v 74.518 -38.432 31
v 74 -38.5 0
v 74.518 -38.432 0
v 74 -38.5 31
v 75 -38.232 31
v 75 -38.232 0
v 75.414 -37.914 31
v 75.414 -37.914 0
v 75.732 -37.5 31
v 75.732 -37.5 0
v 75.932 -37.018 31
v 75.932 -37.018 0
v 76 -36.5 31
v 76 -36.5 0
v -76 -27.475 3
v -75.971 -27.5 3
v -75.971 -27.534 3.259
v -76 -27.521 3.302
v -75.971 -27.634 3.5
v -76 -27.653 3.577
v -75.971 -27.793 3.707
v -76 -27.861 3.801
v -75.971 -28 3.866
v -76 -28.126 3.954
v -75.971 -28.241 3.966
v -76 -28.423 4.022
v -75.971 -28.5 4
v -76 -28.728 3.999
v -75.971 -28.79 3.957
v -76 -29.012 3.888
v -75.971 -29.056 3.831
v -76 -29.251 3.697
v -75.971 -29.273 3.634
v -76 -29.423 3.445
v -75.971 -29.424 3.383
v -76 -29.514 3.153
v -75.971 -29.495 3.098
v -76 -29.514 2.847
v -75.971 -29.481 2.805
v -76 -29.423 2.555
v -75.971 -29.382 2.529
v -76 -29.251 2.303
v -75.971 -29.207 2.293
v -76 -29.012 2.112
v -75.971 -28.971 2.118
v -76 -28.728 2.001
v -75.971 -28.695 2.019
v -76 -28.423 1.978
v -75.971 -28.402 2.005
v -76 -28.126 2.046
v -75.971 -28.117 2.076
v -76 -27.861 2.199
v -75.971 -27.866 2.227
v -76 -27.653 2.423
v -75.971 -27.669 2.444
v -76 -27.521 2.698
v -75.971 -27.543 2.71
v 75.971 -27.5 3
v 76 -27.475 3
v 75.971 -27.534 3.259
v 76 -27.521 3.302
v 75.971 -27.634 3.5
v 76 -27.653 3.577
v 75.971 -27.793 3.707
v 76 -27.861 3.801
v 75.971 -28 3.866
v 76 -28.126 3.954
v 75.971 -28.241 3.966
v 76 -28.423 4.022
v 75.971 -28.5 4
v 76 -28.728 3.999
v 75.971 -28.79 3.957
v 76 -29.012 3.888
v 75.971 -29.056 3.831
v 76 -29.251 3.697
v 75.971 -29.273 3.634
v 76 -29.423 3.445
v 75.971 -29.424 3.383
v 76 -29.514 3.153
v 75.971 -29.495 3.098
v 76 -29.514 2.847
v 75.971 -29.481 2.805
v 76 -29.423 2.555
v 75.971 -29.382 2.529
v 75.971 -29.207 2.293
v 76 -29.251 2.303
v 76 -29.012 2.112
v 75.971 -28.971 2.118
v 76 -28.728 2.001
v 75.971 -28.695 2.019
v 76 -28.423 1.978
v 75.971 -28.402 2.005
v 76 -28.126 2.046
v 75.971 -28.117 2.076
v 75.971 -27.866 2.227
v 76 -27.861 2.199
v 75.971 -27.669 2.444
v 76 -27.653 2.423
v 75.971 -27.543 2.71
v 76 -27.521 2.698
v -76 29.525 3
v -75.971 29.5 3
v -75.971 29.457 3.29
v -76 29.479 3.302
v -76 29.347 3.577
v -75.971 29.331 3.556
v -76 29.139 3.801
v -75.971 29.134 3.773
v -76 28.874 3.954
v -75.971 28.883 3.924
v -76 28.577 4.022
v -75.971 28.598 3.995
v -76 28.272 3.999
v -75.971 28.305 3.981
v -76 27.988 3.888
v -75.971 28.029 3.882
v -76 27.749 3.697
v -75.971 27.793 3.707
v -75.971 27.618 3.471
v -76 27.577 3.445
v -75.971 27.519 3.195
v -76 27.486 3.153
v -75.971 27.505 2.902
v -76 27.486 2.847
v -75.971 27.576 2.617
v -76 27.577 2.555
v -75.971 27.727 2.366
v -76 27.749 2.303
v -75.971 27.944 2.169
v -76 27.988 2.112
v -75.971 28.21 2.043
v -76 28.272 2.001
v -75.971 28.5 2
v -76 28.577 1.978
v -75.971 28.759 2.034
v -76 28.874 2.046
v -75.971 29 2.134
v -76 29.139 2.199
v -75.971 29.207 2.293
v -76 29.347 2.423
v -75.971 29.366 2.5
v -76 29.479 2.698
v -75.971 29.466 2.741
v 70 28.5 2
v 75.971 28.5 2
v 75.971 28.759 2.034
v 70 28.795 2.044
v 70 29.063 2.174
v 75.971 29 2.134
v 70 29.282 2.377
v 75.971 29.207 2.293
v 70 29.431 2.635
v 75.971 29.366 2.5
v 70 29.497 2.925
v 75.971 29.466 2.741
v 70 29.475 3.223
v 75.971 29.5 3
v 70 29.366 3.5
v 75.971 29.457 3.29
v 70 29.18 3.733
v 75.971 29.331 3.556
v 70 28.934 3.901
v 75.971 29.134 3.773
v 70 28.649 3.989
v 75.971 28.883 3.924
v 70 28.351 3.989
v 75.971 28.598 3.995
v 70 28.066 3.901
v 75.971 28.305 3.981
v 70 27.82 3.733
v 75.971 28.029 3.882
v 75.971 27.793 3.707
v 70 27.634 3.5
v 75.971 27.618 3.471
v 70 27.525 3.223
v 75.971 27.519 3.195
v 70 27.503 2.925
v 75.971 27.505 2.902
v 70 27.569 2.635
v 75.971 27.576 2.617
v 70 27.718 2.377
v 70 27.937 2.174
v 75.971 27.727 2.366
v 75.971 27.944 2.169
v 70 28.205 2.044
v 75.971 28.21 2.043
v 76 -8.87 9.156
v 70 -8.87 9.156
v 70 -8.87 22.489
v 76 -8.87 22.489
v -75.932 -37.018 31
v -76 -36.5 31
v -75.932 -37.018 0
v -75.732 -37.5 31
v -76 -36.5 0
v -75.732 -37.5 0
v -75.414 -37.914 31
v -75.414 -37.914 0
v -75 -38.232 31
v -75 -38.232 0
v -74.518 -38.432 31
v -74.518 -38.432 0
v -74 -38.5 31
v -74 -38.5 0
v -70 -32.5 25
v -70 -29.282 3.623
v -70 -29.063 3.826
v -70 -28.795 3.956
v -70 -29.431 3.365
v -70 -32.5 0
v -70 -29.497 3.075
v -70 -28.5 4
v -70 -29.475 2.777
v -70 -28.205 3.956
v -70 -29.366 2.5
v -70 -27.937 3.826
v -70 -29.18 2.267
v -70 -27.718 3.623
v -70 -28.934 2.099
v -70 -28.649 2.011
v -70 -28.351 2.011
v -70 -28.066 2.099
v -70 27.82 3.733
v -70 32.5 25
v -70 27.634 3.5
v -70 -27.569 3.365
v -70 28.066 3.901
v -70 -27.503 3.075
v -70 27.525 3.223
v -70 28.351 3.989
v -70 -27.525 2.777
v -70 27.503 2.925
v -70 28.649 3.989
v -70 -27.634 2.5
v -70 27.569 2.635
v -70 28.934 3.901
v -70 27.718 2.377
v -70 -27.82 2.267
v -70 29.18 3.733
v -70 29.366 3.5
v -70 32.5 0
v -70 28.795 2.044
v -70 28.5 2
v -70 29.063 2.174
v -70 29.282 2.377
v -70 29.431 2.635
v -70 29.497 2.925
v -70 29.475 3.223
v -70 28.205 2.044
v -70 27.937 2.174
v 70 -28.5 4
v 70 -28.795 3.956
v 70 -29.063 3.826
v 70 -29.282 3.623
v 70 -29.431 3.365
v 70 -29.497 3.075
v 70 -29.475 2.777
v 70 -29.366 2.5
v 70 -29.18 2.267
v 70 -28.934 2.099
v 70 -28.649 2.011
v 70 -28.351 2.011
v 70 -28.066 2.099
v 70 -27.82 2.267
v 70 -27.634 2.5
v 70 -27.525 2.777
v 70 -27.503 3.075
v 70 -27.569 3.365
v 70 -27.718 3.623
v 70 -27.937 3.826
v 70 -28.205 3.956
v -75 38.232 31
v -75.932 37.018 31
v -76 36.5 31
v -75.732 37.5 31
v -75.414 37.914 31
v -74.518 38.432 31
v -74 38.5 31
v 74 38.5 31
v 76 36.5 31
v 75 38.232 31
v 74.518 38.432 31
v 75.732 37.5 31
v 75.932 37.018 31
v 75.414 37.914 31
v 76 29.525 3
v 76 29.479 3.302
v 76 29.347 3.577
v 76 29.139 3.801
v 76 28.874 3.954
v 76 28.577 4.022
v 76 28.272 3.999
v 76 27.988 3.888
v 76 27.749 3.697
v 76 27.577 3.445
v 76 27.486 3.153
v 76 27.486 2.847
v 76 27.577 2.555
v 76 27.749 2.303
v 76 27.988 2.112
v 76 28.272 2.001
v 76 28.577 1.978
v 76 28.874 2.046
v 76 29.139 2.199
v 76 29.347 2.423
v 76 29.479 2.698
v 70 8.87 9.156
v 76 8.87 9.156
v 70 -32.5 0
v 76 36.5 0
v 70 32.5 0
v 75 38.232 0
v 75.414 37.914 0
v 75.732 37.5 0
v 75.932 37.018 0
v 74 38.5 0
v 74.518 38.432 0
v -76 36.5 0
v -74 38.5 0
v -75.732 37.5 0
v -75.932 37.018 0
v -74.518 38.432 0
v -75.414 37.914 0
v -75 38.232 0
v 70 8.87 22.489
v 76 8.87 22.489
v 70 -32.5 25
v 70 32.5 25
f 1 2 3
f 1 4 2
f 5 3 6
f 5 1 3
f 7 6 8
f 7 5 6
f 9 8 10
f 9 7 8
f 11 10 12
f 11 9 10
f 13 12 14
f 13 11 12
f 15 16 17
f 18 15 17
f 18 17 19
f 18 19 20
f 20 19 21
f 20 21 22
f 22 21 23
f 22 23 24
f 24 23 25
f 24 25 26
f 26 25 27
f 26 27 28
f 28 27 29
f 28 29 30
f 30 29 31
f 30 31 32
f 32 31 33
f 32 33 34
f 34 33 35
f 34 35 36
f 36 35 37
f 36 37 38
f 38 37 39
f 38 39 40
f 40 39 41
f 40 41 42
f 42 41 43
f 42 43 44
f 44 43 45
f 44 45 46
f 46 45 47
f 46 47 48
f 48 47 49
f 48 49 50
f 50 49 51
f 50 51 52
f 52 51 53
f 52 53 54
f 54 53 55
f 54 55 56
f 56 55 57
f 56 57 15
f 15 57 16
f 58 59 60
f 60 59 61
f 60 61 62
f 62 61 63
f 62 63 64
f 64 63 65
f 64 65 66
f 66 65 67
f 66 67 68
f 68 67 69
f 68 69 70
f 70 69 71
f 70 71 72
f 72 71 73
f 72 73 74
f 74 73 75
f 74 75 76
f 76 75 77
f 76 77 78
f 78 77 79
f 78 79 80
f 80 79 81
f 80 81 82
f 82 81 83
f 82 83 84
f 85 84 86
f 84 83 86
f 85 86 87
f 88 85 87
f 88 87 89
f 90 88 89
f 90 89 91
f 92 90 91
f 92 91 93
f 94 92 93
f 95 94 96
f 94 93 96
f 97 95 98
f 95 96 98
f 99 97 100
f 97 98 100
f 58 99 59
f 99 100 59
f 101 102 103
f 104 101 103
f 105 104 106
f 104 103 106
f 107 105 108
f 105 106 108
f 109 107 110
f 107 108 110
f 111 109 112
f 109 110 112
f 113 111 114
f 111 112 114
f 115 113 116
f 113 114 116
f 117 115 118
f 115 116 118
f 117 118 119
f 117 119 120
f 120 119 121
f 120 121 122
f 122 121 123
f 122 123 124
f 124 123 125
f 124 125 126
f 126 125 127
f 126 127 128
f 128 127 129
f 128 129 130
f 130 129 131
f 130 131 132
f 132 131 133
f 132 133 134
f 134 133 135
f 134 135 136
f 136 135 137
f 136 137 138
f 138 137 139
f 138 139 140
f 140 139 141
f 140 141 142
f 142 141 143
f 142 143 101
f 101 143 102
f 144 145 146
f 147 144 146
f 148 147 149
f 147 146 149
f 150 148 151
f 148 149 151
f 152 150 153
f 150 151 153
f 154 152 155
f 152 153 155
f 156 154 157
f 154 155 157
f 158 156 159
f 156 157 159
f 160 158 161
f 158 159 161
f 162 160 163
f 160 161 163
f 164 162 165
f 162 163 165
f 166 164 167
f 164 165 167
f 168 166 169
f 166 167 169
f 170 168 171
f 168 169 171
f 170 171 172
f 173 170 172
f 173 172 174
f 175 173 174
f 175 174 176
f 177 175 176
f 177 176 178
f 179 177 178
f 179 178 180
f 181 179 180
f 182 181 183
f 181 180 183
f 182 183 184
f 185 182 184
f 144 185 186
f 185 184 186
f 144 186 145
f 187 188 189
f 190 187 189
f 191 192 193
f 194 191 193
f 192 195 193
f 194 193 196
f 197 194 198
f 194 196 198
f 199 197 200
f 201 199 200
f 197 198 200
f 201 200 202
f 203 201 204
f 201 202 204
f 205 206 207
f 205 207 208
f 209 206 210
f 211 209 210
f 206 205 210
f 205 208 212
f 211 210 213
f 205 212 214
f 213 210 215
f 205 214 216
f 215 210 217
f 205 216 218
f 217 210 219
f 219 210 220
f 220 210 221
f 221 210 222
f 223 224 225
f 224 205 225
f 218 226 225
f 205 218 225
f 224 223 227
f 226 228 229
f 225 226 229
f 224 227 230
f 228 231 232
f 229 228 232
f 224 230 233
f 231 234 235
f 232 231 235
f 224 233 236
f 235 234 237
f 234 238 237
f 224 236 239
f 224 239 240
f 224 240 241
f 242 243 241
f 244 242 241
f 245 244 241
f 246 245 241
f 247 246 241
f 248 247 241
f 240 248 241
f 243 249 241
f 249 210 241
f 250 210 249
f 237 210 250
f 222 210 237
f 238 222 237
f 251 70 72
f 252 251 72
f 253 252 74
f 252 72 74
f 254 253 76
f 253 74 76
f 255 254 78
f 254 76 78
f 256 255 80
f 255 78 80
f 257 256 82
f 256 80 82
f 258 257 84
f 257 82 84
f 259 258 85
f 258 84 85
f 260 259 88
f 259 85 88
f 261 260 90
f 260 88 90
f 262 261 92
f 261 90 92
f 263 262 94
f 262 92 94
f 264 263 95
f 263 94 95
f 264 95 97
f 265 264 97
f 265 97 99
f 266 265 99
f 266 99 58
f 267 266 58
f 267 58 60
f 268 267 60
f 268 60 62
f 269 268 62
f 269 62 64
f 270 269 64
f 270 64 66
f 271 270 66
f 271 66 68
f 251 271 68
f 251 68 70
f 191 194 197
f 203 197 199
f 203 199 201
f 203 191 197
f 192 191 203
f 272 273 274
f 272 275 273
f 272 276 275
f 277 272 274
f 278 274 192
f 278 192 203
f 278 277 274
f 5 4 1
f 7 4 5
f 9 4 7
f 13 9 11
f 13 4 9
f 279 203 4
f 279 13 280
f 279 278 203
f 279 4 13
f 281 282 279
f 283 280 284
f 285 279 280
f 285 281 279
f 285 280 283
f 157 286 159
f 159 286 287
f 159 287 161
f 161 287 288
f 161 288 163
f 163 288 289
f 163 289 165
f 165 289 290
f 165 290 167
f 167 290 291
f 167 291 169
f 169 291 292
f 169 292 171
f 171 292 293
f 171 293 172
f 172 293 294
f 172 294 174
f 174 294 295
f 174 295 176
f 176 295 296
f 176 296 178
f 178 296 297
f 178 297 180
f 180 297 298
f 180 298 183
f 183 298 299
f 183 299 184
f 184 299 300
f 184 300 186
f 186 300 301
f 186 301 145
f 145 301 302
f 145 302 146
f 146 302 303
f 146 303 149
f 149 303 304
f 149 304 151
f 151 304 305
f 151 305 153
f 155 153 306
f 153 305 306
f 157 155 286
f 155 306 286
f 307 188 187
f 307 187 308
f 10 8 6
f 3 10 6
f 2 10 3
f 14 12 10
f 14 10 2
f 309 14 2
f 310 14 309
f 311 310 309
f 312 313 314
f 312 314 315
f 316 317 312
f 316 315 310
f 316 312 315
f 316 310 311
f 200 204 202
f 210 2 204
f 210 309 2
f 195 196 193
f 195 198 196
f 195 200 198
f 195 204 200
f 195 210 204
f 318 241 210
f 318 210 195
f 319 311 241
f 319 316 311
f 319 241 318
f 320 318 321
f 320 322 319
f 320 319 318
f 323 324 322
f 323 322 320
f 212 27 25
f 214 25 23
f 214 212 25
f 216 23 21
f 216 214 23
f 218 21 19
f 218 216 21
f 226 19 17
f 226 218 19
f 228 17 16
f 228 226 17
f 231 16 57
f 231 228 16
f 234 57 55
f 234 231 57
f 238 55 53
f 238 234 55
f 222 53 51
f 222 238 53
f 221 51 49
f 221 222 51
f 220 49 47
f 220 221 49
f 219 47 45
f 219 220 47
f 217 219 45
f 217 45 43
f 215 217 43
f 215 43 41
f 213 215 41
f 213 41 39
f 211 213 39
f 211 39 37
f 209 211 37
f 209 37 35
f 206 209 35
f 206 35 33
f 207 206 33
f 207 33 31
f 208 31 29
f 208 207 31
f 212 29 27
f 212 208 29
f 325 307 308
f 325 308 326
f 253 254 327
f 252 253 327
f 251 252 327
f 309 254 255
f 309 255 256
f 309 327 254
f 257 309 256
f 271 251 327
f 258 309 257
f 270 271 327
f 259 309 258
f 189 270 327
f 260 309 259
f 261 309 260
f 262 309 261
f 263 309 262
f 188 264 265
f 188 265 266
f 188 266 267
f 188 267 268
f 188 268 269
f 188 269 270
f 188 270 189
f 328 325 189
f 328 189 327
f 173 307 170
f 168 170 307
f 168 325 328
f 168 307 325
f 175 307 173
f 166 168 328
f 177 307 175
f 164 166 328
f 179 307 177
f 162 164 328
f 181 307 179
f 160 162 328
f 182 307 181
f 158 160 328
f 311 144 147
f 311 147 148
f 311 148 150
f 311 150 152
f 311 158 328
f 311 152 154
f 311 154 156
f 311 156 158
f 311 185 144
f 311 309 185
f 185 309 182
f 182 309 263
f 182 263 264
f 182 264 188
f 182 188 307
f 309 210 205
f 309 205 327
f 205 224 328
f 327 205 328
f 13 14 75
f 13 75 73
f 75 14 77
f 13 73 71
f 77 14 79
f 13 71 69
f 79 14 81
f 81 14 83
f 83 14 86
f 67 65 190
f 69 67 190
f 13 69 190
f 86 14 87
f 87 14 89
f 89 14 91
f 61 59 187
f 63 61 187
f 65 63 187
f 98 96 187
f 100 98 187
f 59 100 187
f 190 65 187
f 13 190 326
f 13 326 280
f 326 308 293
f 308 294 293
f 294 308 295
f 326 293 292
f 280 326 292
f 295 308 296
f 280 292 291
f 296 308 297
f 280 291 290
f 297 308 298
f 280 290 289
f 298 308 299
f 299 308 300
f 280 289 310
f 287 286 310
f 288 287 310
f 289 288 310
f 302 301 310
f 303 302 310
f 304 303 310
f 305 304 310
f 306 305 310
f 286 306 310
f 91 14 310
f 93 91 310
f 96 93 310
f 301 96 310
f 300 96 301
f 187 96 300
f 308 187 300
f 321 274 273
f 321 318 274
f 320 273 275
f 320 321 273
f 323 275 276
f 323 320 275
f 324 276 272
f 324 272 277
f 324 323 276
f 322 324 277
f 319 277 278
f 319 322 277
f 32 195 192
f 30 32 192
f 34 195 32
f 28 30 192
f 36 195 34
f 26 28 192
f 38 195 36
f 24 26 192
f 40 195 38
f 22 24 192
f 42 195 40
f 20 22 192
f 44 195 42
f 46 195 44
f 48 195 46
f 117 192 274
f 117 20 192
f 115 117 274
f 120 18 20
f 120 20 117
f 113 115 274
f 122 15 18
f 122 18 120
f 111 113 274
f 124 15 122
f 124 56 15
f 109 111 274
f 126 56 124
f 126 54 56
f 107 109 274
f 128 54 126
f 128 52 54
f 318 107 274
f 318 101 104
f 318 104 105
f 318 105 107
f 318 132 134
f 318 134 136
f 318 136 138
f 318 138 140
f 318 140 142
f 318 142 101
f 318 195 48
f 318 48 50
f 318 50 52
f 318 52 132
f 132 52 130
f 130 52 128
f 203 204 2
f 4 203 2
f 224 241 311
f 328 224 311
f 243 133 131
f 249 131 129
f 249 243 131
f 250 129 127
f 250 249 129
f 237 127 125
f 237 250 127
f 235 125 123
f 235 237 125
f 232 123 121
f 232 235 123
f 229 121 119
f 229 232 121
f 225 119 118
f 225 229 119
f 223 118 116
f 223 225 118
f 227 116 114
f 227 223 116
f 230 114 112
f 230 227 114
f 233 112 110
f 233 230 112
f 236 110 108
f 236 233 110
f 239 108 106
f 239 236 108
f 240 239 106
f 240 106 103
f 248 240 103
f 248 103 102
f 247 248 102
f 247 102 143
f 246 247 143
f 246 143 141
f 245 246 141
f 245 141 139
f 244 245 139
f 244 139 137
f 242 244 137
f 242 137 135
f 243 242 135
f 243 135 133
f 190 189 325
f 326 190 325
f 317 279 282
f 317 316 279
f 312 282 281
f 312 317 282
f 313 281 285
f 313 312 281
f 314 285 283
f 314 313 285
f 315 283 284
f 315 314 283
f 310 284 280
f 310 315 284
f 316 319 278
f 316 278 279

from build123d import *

# Parameters (mm, degrees)
IZIM1_W                     = 140
IZIM1_H                     = 65
Y_KSEKLIK_EKSTR_ZYON1_DEPTH = 25
BO_ALTMA3_T                 = 6
IZIM2_R                     = 2.25
KES_EKSTR_ZYON1_DEPTH       = 25
IZIM3_W                     = 13.33242511
IZIM3_H                     = 17.74072696
KES_EKSTR_ZYON2_DEPTH       = 25
RADYUS1_R                   = 2
Y_KSEKLIK_EKSTR_ZYON2_START = 25
IZIM4_R                     = 2.25
Y_KSEKLIK_EKSTR_ZYON2_DEPTH = 25
IZIM5_R                     = 1
KES_EKSTR_ZYON3_DEPTH       = 20
KES_EKSTR_ZYON4_START       = -20
IZIM6_R                     = 1
KES_EKSTR_ZYON4_DEPTH       = 20


# Read off the part's stored shape, not the designer's step: M2 Dişli Delik1
with BuildPart() as part:
    # Çizim1 → Yükseklik-Ekstrüzyon1 (new body)
    with BuildSketch(Plane.XY):
        Rectangle(IZIM1_W, IZIM1_H)
    extrude(amount=Y_KSEKLIK_EKSTR_ZYON1_DEPTH)

    # İç Boşaltma3
    bo_altma3_openings = [part.faces().sort_by_distance(p)[0] for p in [
        (0, 0, 0),
    ]]
    offset(amount=BO_ALTMA3_T, openings=bo_altma3_openings, kind=Kind.INTERSECTION)

    # Çizim2 → Kes-Ekstrüzyon1 (cut)
    with BuildSketch(Plane(origin=(0, 0, 0), x_dir=(-1, 0, 0), z_dir=(0, 0, -1))):
        with Locations((-73, -35.5)):
            Circle(IZIM2_R)
        with Locations(Location((73, -35.5, 0), (0, 0, 180))):
            Circle(IZIM2_R)
        with Locations(Location((-73, 35.5, 0), (0, 0, 180))):
            Circle(IZIM2_R)
        with Locations((73, 35.5)):
            Circle(IZIM2_R)
    extrude(amount=-KES_EKSTR_ZYON1_DEPTH, mode=Mode.SUBTRACT)

    # Çizim3 → Kes-Ekstrüzyon2 (cut)
    with BuildSketch(Plane.ZY.offset(-70)):
        with Locations((15.822558672, 0)):
            Rectangle(IZIM3_W, IZIM3_H)
    extrude(amount=-KES_EKSTR_ZYON2_DEPTH, mode=Mode.SUBTRACT)

    # Radyus1
    radyus1_edges = [part.edges().sort_by_distance(p)[0] for p in [
        (76, -38.5, 15.5),
        (-76, -38.5, 15.5),
        (-76, 38.5, 15.5),
        (76, 38.5, 15.5),
    ]]
    fillet(radyus1_edges, radius=RADYUS1_R)

    # Çizim4 → Yükseklik-Ekstrüzyon2 (add)
    with BuildSketch(Plane(origin=(0, 0, 25), x_dir=(-1, 0, 0), z_dir=(0, 0, -1)).offset(Y_KSEKLIK_EKSTR_ZYON2_START)):
        with Locations((73, 35.5)):
            Circle(IZIM4_R)
        with Locations((73, -35.5)):
            Circle(IZIM4_R)
        with Locations((-73, 35.5)):
            Circle(IZIM4_R)
        with Locations((-73, -35.5)):
            Circle(IZIM4_R)
    extrude(amount=-Y_KSEKLIK_EKSTR_ZYON2_DEPTH)

    # Çizim5 → Kes-Ekstrüzyon3 (cut)
    with BuildSketch(Plane(origin=(76, 0, 0), x_dir=(0, 0, -1), z_dir=(1, 0, 0))):
        with Locations((-3, 28.5)):
            Circle(IZIM5_R)
        with Locations(Location((-3, -28.5, 0), (0, 0, 180))):
            Circle(IZIM5_R)
    extrude(amount=-KES_EKSTR_ZYON3_DEPTH, mode=Mode.SUBTRACT)

    # Çizim6 → Kes-Ekstrüzyon4 (cut)
    with BuildSketch(Plane.ZY.offset(76).offset(KES_EKSTR_ZYON4_START)):
        with Locations(Location((3, 28.5, 0), (0, 0, 180))):
            Circle(IZIM6_R)
        with Locations((3, -28.5)):
            Circle(IZIM6_R)
    extrude(amount=KES_EKSTR_ZYON4_DEPTH, mode=Mode.SUBTRACT)

    # M2 Dişli Delik1 outline → M2 Dişli Delik1 (revolve, cut)
    with BuildSketch(Plane(origin=(0, 28.5, 3), x_dir=(0, 1, 0), z_dir=(0, 0, -1))):
        Polygon((1, 76), (1, 75.97124079), (1.025, 76), align=None)
        Polygon((1.025, -76), (1, -75.97124079), (1, -76), align=None)
    revolve(axis=Axis((0, 28.5, 3), (1, 0, 0)), mode=Mode.SUBTRACT)

    # M2 Di_li Delik1 2 outline → M2 Di_li Delik1 2 (revolve, cut)
    with BuildSketch(Plane(origin=(0, -28.5, 3), x_dir=(0, 1, 0), z_dir=(0, 0, -1))):
        Polygon((1, 76), (1, 75.97124079), (1.025, 76), align=None)
        Polygon((1.025, -76), (1, -75.97124079), (1, -76), align=None)
    revolve(axis=Axis((0, -28.5, 3), (1, 0, 0)), mode=Mode.SUBTRACT)


solid = part.part
